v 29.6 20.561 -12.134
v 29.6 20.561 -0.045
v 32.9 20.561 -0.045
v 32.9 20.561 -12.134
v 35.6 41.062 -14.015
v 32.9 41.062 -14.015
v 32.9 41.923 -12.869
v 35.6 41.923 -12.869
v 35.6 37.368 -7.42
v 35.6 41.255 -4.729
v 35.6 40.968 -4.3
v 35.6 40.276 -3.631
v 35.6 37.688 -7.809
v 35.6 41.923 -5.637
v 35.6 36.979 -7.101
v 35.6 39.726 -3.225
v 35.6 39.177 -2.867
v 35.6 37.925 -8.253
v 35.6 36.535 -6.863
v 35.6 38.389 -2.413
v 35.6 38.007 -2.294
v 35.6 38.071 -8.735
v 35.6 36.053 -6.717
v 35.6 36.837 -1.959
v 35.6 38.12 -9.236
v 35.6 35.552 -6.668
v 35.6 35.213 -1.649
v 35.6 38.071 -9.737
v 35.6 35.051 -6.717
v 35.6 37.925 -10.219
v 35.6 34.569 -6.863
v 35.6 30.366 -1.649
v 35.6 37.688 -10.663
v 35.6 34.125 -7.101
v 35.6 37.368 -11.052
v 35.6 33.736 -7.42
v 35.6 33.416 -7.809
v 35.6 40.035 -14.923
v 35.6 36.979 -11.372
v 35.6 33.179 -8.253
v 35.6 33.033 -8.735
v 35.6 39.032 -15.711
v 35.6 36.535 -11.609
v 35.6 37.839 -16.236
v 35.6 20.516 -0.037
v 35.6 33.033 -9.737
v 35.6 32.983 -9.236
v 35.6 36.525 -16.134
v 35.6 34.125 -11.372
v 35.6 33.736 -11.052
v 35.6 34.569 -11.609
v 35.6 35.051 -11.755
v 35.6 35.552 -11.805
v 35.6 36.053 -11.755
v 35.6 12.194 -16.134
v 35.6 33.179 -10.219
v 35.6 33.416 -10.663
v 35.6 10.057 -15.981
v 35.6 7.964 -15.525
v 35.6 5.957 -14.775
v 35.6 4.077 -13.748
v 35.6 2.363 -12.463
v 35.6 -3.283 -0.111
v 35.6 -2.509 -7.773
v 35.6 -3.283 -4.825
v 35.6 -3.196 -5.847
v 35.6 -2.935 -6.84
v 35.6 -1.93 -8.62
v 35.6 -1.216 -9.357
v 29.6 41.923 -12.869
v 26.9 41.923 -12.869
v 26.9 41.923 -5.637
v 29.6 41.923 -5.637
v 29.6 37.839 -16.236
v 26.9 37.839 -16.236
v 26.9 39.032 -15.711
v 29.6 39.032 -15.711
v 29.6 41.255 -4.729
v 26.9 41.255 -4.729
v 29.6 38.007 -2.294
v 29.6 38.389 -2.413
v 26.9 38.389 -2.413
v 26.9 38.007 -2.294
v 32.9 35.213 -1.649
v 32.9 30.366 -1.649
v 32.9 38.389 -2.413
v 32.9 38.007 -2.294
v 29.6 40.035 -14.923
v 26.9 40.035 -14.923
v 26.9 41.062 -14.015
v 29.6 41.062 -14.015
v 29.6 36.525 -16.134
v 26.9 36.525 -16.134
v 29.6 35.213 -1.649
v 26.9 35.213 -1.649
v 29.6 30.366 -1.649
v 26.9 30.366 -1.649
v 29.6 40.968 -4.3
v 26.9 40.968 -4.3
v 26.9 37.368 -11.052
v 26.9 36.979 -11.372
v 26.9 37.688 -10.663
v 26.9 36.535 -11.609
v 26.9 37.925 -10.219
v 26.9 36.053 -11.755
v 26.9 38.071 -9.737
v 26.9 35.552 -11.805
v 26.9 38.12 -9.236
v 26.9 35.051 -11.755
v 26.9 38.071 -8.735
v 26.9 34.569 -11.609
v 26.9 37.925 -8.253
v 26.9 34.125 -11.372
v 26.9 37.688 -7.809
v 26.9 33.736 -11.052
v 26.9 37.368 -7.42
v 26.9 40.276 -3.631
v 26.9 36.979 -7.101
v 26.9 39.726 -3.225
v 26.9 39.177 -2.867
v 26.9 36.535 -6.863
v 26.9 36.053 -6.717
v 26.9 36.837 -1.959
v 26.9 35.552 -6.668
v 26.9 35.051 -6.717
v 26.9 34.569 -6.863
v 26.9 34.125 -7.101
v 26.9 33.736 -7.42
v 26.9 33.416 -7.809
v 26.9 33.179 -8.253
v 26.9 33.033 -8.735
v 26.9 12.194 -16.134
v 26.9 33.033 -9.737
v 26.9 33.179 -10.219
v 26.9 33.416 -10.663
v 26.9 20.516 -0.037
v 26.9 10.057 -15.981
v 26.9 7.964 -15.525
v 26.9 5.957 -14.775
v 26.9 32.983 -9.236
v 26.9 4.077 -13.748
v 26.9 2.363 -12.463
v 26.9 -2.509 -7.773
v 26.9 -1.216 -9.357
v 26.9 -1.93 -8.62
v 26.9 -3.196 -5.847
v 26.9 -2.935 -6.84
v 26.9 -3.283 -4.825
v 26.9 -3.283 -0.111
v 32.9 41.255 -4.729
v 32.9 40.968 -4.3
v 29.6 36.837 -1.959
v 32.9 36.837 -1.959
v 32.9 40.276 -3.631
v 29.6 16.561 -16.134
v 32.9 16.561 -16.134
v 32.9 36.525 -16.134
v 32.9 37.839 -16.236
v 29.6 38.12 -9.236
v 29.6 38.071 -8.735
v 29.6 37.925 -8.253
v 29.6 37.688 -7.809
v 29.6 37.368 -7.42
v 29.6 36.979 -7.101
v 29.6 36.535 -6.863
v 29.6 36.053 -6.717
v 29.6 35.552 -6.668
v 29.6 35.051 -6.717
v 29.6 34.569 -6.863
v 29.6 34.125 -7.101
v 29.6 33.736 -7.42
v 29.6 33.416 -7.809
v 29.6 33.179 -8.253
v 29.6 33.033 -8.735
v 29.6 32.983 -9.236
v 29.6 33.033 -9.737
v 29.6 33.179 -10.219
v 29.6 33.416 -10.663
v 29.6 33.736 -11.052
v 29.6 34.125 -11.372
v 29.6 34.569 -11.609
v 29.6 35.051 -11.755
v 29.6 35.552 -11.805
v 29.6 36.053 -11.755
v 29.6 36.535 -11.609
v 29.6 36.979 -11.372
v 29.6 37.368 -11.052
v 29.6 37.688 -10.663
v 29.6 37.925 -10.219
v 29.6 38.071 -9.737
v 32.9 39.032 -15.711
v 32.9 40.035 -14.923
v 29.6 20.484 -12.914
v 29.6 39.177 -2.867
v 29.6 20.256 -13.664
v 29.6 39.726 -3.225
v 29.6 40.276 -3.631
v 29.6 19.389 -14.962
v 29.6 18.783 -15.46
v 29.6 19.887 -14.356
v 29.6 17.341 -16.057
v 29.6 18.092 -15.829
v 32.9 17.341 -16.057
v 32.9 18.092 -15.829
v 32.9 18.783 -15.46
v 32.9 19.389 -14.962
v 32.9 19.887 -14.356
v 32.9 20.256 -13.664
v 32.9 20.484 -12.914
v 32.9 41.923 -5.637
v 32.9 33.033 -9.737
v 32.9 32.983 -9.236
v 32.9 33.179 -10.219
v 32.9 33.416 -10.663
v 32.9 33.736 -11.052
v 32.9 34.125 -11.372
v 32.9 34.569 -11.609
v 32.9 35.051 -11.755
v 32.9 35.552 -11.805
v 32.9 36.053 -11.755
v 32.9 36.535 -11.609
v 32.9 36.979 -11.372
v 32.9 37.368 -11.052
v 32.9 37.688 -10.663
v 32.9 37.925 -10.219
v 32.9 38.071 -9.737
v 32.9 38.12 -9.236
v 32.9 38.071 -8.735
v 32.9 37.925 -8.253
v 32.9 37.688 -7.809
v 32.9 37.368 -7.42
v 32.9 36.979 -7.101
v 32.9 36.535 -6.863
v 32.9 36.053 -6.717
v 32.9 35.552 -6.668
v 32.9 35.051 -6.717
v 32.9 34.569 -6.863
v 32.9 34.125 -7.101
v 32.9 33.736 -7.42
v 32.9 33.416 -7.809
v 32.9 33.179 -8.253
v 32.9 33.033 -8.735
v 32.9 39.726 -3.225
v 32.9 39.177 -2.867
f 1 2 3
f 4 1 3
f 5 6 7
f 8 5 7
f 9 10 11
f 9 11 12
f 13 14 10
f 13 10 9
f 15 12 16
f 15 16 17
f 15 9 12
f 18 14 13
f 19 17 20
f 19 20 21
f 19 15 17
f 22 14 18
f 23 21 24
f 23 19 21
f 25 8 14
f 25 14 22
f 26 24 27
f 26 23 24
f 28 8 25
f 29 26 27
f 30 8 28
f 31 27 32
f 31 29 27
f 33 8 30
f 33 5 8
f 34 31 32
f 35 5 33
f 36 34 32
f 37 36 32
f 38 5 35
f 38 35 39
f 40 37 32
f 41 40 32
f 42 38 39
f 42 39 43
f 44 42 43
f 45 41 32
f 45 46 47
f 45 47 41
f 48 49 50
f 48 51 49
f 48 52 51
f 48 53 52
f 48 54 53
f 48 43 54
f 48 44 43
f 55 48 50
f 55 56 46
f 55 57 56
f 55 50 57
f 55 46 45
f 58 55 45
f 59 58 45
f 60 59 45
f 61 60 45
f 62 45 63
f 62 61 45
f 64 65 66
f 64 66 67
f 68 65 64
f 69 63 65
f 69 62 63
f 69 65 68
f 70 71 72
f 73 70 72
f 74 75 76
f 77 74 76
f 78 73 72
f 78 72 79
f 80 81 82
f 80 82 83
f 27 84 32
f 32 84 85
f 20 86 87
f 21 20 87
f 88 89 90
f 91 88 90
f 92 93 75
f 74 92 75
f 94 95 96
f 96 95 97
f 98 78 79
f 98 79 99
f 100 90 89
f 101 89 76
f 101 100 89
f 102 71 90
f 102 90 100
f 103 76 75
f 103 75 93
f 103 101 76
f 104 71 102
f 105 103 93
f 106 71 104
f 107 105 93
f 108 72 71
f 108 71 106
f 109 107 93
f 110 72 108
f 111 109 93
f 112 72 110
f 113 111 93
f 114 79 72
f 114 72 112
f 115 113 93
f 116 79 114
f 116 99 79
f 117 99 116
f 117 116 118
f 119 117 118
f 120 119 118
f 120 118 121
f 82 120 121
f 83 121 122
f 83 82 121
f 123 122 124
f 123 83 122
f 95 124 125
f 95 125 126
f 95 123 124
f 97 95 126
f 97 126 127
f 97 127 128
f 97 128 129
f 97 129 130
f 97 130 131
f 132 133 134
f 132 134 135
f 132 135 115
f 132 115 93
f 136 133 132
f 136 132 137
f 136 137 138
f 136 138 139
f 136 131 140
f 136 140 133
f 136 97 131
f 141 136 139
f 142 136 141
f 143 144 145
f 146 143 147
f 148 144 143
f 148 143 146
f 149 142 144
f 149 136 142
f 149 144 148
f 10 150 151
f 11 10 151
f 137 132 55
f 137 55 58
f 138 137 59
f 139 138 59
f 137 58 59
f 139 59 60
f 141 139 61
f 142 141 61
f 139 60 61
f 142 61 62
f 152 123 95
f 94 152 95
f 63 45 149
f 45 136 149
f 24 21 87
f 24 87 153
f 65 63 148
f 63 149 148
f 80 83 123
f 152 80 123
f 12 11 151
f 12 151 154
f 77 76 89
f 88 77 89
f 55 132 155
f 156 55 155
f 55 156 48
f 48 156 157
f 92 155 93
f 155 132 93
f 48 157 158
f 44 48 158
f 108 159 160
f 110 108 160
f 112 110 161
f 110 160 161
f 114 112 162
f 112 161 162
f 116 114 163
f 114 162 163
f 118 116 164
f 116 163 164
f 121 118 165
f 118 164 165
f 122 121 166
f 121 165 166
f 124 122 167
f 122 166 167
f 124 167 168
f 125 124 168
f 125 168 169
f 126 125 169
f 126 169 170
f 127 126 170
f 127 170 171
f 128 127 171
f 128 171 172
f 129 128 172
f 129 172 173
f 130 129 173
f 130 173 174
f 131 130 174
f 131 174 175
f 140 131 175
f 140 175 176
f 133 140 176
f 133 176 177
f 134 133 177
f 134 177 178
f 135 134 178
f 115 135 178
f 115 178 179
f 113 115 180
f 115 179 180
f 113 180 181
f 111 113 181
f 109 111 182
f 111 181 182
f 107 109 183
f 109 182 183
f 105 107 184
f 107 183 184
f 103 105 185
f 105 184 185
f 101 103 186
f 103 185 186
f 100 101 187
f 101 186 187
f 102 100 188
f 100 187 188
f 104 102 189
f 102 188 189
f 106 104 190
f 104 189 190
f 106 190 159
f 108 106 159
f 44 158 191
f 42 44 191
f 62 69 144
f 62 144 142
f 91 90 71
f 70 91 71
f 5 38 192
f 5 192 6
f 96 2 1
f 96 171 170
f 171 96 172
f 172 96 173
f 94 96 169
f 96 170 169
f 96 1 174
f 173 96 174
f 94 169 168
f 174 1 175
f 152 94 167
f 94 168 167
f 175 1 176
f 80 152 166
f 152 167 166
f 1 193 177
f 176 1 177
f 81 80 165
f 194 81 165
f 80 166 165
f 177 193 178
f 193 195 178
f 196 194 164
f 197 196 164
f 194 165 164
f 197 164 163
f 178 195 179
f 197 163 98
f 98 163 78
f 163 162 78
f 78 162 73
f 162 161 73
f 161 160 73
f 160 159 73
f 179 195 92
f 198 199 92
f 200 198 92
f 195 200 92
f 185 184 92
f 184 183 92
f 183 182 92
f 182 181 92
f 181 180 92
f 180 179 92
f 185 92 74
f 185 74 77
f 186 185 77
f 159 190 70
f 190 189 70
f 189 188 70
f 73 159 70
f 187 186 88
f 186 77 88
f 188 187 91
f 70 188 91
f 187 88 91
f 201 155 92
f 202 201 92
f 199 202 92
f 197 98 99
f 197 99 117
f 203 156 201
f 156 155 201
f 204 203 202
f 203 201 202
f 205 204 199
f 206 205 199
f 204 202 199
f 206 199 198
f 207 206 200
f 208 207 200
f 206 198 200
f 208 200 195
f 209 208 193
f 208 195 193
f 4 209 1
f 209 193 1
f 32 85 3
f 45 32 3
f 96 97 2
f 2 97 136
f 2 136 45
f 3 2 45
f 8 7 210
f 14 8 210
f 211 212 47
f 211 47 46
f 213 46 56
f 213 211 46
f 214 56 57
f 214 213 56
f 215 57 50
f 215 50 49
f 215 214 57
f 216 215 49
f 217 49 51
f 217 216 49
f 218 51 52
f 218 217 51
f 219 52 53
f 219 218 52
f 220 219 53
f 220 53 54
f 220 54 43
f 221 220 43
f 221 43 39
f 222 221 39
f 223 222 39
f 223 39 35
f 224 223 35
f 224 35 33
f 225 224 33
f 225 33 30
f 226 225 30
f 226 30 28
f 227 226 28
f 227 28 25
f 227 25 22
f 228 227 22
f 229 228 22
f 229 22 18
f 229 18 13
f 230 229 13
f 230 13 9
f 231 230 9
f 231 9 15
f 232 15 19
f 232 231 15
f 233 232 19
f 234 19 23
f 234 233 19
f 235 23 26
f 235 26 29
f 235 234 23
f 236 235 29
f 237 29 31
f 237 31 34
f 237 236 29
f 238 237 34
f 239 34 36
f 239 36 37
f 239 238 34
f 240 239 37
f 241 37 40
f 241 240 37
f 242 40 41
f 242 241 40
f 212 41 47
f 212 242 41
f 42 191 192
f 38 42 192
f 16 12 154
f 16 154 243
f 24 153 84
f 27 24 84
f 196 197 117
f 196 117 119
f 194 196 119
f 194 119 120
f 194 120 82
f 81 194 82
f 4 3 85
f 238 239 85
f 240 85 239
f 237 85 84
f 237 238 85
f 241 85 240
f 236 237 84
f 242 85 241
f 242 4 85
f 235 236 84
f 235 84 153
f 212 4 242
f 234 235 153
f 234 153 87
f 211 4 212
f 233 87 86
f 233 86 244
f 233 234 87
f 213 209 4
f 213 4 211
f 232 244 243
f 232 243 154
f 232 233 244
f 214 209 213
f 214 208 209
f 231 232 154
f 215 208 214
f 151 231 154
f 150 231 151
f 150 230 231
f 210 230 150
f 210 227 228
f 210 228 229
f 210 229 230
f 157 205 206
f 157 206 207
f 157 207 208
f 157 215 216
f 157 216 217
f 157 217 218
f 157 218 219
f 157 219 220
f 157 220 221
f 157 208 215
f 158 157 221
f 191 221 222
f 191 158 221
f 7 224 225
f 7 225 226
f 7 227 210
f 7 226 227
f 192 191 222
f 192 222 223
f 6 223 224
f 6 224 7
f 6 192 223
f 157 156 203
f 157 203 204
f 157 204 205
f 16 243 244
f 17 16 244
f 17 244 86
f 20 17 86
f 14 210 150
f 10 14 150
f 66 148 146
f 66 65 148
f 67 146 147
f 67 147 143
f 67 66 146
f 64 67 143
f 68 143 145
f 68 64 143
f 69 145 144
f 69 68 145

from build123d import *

# Parameters (mm, degrees)
SKETCH013_R     = 2.568486
PAD009_DEPTH    = 2.7
PAD009_FACE24_R = 2.568486
PAD010_DEPTH    = 6
SKETCH014_W     = 26.409815
SKETCH014_H     = 3.3
POCKET002_DEPTH = 17.5
FILLET004_R     = 15
FILLET005_R     = 4
FILLET006_R     = 6


with BuildPart() as part:
    # Sketch013 → Pad009 (new body)
    with BuildSketch(Plane.YZ.offset(2.7)):
        Polygon((20.516043, -0.037444), (30.366142, -1.649044), (35.213383, -1.649044), (36.83709, -1.959458), (38.007114, -2.29375), (38.389164, -2.413141), (39.177135, -2.866822), (39.72633, -3.224993), (40.275524, -3.63092), (40.967991, -4.299505), (41.254524, -4.729309), (41.923111, -5.636675), (41.923111, -12.869325), (41.062038, -14.015471), (40.035282, -14.922836), (39.032402, -15.710812), (37.838501, -16.236128), (36.525211, -16.133759), (35.140285, -16.133759), (6.593163, -16.133759), (-3.283293, -7.56256), (-3.283293, -0.110564), align=None)
        with Locations((35.551899, -9.23625)):
            Circle(SKETCH013_R, mode=Mode.SUBTRACT)
    extrude(amount=-PAD009_DEPTH)

    # Pad009 Face24 → Pad010 (add)
    with BuildSketch(Plane(origin=(2.7, 19.058053, -8.03373), x_dir=(0, -1, 0), z_dir=(1, 0, 0))):
        Polygon((-11.308089, -6.384686), (-1.45799, -7.996286), (22.341346, -7.923166), (22.341346, -0.47117), (12.46489, 8.100029), (-16.082232, 8.100029), (-17.467158, 8.100029), (-18.780448, 8.202398), (-19.974349, 7.677082), (-20.977229, 6.889106), (-22.003985, 5.981741), (-22.865058, 4.835595), (-22.865058, -2.397055), (-22.196471, -3.304421), (-21.909938, -3.734225), (-21.217471, -4.40281), (-20.668277, -4.808737), (-20.119082, -5.166908), (-19.331111, -5.620589), (-18.949061, -5.73998), (-17.779037, -6.074272), (-16.15533, -6.384686), align=None)
        with Locations((-16.493846, 1.20252)):
            Circle(PAD009_FACE24_R, mode=Mode.SUBTRACT)
    extrude(amount=PAD010_DEPTH)

    # Sketch014 (on Face46 of Pad010) → Pocket002 (cut, symmetric)
    with BuildSketch(Plane.YX.offset(16.133759)):
        with Locations((33.765693, 4.35)):
            Rectangle(SKETCH014_W, SKETCH014_H)
    extrude(amount=POCKET002_DEPTH, both=True, mode=Mode.SUBTRACT)

    # Fillet004
    fillet004_edges = [part.edges().sort_by_distance(p)[0] for p in [
        (5.7, 6.593163, -16.133759),
    ]]
    fillet(fillet004_edges, radius=FILLET004_R)

    # Fillet005
    fillet005_edges = [part.edges().sort_by_distance(p)[0] for p in [
        (4.35, 20.560785, -16.133759),
    ]]
    fillet(fillet005_edges, radius=FILLET005_R)

    # Fillet006
    fillet006_edges = [part.edges().sort_by_distance(p)[0] for p in [
        (5.7, -3.283293, -7.56256),
    ]]
    fillet(fillet006_edges, radius=FILLET006_R)


with BuildPart() as part_1:
    # Body005 placement: moved
    add(part.part.moved(Location((26.9, 0, 0))))


solid = part_1.part
